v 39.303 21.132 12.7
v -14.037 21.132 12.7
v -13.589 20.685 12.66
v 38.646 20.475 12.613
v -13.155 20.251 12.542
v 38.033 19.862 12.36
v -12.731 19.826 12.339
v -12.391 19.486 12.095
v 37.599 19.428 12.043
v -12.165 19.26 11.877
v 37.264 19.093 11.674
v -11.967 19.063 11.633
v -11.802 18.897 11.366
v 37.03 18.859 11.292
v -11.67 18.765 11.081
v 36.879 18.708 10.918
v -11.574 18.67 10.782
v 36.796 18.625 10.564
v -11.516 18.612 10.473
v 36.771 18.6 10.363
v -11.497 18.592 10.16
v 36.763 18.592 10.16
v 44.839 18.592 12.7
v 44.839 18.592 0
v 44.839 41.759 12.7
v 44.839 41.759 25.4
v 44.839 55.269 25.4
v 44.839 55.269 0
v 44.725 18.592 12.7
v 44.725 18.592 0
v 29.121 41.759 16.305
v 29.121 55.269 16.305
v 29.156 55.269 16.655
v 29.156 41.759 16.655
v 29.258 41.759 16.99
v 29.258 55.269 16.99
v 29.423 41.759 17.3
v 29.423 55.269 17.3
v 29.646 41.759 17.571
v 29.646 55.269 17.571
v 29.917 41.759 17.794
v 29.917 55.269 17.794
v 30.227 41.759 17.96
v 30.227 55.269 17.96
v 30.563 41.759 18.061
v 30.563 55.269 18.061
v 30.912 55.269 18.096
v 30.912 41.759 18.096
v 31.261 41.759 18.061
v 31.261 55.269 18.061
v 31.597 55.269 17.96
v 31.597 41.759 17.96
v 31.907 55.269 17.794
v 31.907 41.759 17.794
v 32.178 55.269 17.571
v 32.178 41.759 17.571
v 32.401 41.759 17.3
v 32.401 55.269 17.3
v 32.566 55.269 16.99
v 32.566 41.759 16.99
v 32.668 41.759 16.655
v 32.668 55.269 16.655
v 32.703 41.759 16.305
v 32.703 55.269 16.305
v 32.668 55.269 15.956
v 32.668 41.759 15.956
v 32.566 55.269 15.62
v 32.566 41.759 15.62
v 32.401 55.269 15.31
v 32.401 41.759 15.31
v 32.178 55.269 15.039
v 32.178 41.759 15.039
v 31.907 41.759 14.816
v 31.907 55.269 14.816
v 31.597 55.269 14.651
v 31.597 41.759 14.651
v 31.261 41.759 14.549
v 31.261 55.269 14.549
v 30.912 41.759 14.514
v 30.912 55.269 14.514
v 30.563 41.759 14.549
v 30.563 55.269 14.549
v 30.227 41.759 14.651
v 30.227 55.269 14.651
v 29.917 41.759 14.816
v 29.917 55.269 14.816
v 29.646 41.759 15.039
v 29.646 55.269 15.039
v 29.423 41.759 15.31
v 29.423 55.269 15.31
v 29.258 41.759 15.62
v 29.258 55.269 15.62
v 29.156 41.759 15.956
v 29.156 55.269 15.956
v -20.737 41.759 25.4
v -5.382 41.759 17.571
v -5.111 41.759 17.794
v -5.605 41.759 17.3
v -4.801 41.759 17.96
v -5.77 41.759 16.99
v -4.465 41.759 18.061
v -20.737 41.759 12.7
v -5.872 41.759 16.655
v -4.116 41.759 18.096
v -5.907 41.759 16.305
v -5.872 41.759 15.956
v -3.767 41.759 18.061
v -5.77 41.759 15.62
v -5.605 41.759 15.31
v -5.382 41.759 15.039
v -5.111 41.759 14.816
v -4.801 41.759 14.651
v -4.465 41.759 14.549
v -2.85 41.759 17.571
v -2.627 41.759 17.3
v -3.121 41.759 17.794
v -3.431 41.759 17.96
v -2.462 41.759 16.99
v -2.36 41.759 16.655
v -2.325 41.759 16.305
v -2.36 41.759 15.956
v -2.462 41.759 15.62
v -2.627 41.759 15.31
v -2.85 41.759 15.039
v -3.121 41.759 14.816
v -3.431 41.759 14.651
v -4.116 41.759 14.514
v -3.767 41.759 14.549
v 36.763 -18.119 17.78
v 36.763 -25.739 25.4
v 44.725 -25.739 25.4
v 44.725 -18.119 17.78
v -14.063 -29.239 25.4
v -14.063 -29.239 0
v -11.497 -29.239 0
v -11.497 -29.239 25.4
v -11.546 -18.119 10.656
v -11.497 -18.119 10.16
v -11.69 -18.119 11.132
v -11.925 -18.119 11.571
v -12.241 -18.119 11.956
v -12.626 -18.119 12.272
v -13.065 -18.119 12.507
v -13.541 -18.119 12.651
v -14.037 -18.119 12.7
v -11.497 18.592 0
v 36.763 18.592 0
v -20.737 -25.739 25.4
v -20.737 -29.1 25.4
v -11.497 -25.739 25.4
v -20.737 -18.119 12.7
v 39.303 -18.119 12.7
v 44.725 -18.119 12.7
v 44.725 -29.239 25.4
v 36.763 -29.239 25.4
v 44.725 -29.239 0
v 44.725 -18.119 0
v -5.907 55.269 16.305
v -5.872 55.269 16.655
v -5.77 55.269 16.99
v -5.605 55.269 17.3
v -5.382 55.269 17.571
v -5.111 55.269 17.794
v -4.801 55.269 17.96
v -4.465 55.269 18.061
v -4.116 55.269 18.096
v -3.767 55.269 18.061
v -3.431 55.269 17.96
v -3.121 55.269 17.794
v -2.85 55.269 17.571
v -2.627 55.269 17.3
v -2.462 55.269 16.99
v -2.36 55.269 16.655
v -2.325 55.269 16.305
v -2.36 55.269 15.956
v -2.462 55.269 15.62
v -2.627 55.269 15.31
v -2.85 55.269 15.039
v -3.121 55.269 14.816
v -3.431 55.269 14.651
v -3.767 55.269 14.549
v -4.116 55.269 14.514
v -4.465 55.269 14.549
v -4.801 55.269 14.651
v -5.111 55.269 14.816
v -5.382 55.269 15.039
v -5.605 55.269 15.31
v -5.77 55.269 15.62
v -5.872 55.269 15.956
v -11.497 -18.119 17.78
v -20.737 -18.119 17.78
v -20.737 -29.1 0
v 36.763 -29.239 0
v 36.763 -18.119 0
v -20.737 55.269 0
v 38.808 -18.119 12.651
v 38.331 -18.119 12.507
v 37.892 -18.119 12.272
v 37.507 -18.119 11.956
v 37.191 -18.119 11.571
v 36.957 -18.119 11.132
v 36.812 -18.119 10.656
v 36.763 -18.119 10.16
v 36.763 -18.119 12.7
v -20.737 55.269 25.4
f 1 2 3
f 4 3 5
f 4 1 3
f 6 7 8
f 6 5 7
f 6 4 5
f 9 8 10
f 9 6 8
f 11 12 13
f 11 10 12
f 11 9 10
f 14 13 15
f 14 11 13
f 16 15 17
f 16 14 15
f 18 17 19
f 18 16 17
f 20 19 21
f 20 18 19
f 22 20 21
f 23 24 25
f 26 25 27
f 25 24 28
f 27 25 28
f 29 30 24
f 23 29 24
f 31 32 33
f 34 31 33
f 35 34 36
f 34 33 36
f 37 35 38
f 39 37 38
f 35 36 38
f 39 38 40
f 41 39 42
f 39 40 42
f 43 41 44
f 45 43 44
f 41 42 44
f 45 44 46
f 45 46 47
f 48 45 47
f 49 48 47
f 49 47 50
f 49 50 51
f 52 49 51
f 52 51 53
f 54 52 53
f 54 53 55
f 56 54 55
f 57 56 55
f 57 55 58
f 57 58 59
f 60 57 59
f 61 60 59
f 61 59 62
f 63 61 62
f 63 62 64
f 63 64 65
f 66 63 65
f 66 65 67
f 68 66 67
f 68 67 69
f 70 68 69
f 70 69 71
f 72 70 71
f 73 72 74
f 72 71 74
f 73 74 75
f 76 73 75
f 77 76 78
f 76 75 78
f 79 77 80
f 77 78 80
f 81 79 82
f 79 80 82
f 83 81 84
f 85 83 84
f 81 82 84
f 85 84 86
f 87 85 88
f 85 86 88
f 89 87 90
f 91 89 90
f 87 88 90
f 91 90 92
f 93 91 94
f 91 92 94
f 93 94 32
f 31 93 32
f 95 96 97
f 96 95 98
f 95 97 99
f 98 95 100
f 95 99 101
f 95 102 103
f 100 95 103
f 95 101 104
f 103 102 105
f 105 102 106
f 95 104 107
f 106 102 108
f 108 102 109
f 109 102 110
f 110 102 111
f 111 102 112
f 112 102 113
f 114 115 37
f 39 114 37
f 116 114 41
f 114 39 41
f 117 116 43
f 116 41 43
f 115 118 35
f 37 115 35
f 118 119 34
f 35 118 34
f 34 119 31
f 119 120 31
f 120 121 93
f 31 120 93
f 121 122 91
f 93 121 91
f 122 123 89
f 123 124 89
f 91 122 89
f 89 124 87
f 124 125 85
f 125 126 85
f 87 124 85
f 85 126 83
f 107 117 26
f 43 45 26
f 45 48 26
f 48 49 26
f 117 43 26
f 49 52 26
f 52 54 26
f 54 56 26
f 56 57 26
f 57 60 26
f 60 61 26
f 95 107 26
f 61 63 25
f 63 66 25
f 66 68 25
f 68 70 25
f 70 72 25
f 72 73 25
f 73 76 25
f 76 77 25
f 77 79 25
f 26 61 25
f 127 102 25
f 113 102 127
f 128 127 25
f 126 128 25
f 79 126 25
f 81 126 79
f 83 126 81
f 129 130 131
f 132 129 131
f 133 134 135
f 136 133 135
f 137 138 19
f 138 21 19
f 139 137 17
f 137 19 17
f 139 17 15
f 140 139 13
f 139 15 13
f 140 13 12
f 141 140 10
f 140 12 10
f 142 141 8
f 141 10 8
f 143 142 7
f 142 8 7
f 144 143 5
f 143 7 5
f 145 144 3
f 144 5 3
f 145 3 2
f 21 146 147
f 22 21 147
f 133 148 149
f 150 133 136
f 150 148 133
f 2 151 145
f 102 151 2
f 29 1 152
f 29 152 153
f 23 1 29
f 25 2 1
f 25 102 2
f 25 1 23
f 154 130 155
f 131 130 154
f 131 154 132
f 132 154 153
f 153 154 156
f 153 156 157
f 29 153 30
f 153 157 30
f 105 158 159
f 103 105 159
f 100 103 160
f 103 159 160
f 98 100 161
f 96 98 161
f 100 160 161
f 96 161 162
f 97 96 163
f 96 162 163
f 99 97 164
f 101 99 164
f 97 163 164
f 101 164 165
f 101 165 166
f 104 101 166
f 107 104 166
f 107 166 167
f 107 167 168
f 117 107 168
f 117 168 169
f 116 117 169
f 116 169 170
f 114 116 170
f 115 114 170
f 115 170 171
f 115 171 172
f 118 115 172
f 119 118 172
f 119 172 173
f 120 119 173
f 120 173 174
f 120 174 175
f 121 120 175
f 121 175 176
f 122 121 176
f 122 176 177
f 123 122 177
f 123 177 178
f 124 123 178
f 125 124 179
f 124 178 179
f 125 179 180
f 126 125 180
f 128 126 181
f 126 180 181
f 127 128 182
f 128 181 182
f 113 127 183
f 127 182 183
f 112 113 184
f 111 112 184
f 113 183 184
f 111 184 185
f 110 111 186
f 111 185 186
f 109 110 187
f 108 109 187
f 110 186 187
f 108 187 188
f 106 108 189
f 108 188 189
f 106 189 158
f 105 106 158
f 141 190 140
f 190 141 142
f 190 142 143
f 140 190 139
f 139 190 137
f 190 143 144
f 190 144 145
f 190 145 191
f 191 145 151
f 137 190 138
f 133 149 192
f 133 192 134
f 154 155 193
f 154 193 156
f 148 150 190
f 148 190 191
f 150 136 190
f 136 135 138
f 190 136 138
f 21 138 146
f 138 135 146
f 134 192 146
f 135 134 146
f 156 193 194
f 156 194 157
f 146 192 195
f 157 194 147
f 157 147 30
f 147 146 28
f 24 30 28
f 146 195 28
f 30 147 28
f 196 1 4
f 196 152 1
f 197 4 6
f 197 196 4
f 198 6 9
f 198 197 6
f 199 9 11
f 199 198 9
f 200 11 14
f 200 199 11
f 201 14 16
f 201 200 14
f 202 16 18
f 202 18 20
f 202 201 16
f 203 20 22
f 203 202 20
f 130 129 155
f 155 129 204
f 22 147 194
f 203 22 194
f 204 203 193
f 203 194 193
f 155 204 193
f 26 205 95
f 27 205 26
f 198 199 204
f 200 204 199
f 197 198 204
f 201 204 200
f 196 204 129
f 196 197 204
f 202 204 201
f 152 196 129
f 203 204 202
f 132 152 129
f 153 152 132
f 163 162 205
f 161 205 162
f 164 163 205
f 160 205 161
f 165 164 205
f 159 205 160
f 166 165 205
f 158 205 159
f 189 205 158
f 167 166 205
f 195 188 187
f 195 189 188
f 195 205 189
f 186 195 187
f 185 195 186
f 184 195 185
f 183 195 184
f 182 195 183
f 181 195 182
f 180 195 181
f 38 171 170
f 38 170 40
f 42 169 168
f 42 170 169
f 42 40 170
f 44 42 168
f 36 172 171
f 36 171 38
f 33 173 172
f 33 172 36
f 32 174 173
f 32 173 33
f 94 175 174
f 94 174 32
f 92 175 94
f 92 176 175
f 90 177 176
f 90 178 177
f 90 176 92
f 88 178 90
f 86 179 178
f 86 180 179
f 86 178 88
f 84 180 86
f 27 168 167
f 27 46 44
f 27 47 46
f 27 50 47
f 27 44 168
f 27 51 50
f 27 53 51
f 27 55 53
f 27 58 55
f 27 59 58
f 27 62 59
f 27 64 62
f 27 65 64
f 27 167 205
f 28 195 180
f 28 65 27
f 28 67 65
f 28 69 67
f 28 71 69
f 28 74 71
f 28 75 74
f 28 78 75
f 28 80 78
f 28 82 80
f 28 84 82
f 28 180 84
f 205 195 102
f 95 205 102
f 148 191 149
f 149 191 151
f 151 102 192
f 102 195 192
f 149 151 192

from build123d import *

# Parameters (mm, degrees)
F0_R     = 1.5930121089
F0_R_2   = 1.27
F1_DEPTH = 12.7
F0_W     = 7.9617746973
F0_H     = 11.1195407808
F0_W_2   = 65.5765477568
F0_H_2   = 13.5095529258
F2_DEPTH = 25.4
F3_SIZE  = 7.62
F5_D     = 3.5814
F6_R     = 2.54


with BuildPart() as f1:
    # F0 (on Top) → F1 (new body)
    with BuildSketch(Plane.XY):
        Polygon((-11.4968402433, 18.5921955854), (-0.2459318388, 18.5921955854), (36.7631597567, 18.5921955854), (44.724934454, 18.5921955854), (44.8390953243, 18.5921955854), (44.8390953243, 41.7590104043), (-20.7374524325, 41.7590104043), (-20.7374524325, 18.5921955854), align=None)
        Polygon((-11.4968402433, 13.8334799558), (-11.4968402433, 18.5921955854), (-20.7374524325, 18.5921955854), (-20.7374524325, -18.1194674224), (-11.4968402433, -18.1194674224), align=None)
        with Locations((-16.2880346179, 13.6660579592)):
            Circle(F0_R, mode=Mode.SUBTRACT)
        Polygon((44.724934454, 18.5921955854), (36.7631597567, 18.5921955854), (36.7631597567, 13.8334799558), (36.7631597567, -18.1194674224), (44.724934454, -18.1194674224), align=None)
        with Locations((40.6009033322, 13.8249658048)):
            Circle(F0_R_2, mode=Mode.SUBTRACT)
        with Locations((40.6009033322, 13.8249658048)):
            Circle(F0_R_2)
        with Locations((-16.2880346179, 13.6660579592)):
            Circle(F0_R)
    extrude(amount=F1_DEPTH)

    # F0 (on Top) → F2 (join)
    with BuildSketch(Plane.XY):
        Polygon((-11.4968402433, -29.2390082031), (-11.4968402433, -18.1194674224), (-20.7374524325, -18.1194674224), (-20.7374524325, -29.0999621163), (-14.0633266419, -29.2390082031), align=None)
        with Locations((40.7440471053, -23.6792378128)):
            Rectangle(F0_W, F0_H)
        with Locations((12.0508214459, 48.5137868673)):
            Rectangle(F0_W_2, F0_H_2)
    extrude(amount=F2_DEPTH)

    # F3
    f3_edges = [f1.edges().sort_by_distance(p)[0] for p in [
        (-16.117146, -18.119467, 25.4),
        (40.744047, -18.119467, 25.4),
    ]]
    chamfer(f3_edges, length=F3_SIZE)

    # F5 (through all)
    with Locations(Plane.XZ):
        with Locations((30.9119317681, 16.3051951677), (-4.1159610264, 16.3051951677)):
            Hole(F5_D / 2)

    # F6
    f6_edges = [f1.edges().sort_by_distance(p)[0] for p in [
        (-11.49684, 0.236364, 12.7),
        (12.63316, 18.592196, 12.7),
        (36.76316, 0.236364, 12.7),
    ]]
    fillet(f6_edges, radius=F6_R)


solid = f1.part
